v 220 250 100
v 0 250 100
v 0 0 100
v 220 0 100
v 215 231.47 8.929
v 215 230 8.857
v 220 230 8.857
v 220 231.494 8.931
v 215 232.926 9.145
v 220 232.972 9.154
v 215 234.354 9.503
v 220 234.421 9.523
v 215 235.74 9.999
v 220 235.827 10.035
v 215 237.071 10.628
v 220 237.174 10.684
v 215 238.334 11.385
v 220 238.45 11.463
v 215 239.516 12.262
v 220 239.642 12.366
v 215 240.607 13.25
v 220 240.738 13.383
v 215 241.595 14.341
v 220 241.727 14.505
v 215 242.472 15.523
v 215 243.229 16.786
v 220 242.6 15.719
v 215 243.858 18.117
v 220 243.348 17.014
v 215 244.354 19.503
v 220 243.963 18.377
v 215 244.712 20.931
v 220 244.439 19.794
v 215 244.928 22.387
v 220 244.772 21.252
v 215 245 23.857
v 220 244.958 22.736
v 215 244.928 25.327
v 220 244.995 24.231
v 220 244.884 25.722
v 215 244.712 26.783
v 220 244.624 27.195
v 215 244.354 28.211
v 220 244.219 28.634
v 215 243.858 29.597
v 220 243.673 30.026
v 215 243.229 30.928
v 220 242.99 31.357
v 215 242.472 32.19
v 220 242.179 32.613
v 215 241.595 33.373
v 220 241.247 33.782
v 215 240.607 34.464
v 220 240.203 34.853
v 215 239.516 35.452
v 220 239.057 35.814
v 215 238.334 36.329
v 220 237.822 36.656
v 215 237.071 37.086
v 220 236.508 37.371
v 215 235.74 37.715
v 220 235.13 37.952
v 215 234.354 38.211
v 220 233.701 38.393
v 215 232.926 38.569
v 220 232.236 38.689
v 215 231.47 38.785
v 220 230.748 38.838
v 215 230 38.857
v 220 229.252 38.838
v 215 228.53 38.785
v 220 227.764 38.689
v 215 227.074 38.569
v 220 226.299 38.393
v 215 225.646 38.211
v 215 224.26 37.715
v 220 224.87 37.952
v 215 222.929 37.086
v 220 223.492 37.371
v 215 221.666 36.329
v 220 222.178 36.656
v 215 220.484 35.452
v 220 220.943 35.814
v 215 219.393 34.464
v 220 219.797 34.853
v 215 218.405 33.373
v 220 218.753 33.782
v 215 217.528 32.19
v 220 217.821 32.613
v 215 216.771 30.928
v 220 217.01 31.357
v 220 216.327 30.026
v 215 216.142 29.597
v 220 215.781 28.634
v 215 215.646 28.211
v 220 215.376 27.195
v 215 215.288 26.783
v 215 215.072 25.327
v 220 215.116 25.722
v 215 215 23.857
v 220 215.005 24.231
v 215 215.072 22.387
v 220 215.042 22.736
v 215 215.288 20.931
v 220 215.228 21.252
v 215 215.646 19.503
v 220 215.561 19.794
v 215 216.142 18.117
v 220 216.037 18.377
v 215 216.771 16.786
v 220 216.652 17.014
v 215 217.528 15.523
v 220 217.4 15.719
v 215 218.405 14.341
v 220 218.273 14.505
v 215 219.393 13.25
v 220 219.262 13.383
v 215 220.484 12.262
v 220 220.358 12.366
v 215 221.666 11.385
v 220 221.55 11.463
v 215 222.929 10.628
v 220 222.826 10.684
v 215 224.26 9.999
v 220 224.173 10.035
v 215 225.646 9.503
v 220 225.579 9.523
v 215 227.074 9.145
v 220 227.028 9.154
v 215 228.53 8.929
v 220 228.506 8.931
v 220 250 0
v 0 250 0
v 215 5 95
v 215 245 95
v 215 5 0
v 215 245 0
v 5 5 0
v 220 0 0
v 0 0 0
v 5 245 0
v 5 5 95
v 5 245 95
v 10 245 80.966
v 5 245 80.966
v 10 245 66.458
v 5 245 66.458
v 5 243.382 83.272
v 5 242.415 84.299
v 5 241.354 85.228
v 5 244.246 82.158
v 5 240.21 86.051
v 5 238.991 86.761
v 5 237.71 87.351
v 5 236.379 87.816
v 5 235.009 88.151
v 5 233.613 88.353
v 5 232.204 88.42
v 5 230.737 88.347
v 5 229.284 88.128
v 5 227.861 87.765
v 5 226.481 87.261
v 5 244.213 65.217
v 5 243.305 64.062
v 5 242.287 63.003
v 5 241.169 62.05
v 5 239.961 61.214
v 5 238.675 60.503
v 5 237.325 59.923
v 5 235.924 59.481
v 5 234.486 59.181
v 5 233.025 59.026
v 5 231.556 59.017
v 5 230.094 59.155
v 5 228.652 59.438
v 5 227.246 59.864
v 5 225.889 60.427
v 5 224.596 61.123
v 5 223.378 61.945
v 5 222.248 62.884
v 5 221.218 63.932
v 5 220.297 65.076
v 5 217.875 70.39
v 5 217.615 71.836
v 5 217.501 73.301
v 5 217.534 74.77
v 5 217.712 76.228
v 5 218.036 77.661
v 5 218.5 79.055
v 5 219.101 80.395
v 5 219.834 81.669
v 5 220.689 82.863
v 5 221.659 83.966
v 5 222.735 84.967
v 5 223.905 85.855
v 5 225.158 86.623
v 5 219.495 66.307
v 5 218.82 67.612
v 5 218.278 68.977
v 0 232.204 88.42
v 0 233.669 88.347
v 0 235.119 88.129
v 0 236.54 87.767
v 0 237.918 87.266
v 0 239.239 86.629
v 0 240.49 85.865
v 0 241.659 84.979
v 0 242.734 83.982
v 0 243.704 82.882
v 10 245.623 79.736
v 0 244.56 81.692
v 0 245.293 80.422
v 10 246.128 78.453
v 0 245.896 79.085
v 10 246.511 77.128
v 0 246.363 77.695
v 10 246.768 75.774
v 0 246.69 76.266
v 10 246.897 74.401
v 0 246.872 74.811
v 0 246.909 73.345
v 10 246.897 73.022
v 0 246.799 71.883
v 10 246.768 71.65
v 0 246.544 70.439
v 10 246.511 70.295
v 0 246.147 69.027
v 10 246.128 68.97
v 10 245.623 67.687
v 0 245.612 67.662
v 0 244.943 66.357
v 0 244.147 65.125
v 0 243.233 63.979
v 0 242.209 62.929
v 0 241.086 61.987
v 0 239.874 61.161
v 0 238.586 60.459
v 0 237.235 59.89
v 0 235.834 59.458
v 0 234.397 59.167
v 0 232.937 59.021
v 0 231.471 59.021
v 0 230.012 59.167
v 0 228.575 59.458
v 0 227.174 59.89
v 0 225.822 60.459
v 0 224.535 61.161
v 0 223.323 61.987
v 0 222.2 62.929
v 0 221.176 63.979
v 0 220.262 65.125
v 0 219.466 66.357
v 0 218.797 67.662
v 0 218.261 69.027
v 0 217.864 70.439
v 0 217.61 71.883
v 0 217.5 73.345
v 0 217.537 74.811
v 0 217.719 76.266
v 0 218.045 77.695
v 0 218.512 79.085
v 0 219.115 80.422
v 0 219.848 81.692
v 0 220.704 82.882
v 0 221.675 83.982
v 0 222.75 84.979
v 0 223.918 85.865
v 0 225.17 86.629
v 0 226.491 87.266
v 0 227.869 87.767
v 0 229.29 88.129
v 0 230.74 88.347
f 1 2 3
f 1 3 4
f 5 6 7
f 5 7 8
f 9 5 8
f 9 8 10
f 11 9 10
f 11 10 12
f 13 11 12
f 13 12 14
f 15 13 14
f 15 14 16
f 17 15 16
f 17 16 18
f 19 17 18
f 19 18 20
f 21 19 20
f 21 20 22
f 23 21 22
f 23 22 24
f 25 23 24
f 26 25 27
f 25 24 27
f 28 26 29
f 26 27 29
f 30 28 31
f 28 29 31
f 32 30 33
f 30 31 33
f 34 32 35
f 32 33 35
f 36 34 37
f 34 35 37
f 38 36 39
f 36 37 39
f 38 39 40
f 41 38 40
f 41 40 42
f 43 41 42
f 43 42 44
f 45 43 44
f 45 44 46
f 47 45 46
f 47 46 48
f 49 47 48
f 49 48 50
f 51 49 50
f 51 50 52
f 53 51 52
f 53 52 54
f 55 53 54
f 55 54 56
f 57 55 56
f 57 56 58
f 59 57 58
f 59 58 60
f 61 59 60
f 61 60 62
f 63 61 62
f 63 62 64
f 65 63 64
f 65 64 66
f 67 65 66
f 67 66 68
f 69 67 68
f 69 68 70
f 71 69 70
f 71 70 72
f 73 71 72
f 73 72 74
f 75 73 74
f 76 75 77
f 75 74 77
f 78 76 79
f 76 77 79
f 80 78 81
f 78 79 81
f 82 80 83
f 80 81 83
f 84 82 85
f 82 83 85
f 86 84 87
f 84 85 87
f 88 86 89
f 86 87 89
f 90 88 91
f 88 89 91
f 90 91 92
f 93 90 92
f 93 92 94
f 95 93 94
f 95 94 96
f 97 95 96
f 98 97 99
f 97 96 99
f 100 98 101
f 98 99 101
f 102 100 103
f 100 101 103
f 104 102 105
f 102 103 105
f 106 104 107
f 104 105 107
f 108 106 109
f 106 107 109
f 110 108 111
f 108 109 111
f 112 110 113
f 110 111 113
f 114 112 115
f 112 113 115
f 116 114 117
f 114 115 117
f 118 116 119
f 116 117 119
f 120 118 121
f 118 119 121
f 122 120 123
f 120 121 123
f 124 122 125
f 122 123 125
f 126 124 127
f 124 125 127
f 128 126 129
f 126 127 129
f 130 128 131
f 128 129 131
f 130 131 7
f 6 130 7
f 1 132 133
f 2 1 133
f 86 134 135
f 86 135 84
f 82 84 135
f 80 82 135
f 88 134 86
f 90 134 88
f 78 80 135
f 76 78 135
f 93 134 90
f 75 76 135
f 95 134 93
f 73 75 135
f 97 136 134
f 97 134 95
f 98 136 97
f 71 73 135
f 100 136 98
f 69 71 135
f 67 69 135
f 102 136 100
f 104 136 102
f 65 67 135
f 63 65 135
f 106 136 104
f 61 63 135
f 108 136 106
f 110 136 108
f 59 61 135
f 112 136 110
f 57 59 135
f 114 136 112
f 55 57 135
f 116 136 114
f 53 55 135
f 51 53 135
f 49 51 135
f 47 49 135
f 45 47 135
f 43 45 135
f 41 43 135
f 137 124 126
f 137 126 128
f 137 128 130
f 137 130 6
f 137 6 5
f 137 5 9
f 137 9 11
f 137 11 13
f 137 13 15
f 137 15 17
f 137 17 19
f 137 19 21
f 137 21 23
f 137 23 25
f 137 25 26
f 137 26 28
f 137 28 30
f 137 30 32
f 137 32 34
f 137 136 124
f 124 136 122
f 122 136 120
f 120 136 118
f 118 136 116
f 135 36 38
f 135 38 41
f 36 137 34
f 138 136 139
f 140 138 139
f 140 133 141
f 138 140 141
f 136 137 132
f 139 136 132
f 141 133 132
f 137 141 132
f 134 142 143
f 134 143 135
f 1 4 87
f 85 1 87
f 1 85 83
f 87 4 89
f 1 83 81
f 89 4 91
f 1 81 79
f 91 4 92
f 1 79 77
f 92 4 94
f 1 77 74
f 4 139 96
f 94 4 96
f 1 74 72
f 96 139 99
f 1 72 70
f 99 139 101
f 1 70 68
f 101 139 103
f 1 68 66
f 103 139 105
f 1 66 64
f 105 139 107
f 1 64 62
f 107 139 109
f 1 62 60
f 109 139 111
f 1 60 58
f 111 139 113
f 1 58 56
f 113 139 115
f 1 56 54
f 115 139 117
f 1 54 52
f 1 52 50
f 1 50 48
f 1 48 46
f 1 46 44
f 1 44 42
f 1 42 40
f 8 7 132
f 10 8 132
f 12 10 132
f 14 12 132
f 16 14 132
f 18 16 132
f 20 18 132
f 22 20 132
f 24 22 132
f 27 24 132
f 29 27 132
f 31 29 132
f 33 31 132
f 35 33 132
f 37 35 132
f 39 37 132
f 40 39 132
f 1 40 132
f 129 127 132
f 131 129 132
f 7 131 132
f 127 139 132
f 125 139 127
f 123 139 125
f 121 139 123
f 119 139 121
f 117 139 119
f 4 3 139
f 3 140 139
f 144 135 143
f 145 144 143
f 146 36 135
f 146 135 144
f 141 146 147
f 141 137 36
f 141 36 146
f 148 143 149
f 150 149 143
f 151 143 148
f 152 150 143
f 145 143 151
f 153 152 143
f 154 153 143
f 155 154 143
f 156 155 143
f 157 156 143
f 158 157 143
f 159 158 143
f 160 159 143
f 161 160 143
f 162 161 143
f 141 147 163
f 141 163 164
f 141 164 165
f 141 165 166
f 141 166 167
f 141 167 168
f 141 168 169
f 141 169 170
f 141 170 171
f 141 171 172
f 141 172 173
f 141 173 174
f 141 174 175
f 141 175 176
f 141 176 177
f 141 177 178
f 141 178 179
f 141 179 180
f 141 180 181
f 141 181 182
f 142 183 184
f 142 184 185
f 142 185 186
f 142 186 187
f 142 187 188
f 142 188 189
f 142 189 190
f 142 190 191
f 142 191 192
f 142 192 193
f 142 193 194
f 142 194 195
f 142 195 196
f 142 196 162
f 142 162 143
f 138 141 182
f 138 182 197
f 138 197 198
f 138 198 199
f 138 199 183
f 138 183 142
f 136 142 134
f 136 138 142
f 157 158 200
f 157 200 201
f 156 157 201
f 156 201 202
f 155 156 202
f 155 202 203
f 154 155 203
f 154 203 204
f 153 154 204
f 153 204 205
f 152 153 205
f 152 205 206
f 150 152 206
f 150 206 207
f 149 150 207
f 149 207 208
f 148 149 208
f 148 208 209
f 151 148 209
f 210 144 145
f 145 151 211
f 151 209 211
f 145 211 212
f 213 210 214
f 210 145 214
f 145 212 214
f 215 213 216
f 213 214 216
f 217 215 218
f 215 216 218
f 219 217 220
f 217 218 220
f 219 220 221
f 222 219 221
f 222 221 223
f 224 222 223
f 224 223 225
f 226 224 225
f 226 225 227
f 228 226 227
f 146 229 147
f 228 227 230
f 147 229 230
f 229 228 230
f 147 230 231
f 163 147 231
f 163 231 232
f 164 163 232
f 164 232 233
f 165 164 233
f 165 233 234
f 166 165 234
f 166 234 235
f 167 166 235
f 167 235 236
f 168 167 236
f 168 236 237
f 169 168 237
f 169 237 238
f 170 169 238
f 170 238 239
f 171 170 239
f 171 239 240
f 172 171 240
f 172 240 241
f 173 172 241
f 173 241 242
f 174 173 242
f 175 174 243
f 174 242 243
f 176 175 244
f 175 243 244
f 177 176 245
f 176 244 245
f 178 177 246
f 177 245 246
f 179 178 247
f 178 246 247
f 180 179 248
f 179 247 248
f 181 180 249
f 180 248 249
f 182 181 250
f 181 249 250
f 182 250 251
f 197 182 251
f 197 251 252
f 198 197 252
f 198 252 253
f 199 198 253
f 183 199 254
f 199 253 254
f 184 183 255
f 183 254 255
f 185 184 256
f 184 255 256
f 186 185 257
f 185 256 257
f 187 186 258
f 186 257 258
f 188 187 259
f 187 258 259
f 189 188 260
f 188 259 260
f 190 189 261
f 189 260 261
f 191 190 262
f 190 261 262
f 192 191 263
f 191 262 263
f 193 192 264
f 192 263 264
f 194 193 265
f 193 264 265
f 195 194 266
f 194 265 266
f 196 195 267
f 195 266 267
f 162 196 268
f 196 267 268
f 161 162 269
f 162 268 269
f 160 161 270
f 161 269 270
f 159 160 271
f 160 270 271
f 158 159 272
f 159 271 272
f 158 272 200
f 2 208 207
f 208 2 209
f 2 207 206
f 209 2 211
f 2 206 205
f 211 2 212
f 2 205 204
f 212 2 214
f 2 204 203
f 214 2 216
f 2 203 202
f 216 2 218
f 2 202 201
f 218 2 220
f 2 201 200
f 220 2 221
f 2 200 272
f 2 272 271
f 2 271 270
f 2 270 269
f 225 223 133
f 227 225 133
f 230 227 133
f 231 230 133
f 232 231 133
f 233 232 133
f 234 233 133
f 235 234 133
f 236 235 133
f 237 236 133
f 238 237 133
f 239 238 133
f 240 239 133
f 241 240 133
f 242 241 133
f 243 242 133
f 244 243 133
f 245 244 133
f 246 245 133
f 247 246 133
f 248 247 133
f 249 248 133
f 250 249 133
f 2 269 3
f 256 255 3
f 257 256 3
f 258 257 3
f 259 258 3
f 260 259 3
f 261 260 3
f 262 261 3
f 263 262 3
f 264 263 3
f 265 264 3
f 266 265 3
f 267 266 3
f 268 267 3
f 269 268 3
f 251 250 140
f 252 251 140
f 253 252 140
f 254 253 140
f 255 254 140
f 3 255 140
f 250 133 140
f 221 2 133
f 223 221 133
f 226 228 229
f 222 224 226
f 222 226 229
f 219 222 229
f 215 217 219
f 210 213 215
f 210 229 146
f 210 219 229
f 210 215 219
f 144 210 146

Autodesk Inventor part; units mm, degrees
ref_plane "YZ Plane" through (0, 0, 0) normal (1, 0, 0) x (0, 1, 0)
ref_plane "XZ Plane" through (0, 0, 0) normal (0, 1, 0) x (-1, 0, 0)
ref_plane "XY Plane" through (0, 0, 0) normal (0, 0, 1) x (1, 0, 0)
sketch "Sketch1" plane through (0, 0, 0) normal (0, 0, 1) x (1, 0, 0)
  line L0 (0, 0) -> (220, 0)
  line L1 (220, 0) -> (220, 250)
  line L2 (220, 250) -> (0, 250)
  line L3 (0, 250) -> (0, 0)
  dimension "d0" = 220
  dimension "d1" = 250
extrude "Extrusion1" add sketch "Sketch1" along normal blind 100
sketch "Sketch2" plane through (0, 0, 0) normal (0, 0, 1) x (1, 0, 0)
  line L0 (5, 5) -> (215, 5)
  line L1 (215, 5) -> (215, 245)
  line L2 (215, 245) -> (5, 245)
  line L3 (5, 245) -> (5, 5)
  point P0 (0, 0)
  dimension "d4" = 210
  dimension "d5" = 240
  dimension "d8" = 5
  dimension "d13" = 5
extrude "Extrusion2" cut sketch "Sketch2" along normal blind 95
sketch "Sketch3" plane through (220, 0, 0) normal (1, 0, 0) x (0, 0, -1)
  circle A0 centre (-23.8569, 230) radius 15
  line L0 (0, 250) -> (-100, 250) projected
  point P0 (0, 0)
  dimension "d9" = 30
  dimension "d10" = 20
extrude "Extrusion3" cut sketch "Sketch3" against normal blind 45
sketch "Sketch4" plane through (0, 0, 0) normal (-1, 0, 0) x (0, 0, 1)
  circle A0 centre (73.7116, 232.2043) radius 14.7089
  point P0 (0, 0)
extrude "Extrusion4" cut sketch "Sketch4" against normal blind 10
properties part number "corpo"
